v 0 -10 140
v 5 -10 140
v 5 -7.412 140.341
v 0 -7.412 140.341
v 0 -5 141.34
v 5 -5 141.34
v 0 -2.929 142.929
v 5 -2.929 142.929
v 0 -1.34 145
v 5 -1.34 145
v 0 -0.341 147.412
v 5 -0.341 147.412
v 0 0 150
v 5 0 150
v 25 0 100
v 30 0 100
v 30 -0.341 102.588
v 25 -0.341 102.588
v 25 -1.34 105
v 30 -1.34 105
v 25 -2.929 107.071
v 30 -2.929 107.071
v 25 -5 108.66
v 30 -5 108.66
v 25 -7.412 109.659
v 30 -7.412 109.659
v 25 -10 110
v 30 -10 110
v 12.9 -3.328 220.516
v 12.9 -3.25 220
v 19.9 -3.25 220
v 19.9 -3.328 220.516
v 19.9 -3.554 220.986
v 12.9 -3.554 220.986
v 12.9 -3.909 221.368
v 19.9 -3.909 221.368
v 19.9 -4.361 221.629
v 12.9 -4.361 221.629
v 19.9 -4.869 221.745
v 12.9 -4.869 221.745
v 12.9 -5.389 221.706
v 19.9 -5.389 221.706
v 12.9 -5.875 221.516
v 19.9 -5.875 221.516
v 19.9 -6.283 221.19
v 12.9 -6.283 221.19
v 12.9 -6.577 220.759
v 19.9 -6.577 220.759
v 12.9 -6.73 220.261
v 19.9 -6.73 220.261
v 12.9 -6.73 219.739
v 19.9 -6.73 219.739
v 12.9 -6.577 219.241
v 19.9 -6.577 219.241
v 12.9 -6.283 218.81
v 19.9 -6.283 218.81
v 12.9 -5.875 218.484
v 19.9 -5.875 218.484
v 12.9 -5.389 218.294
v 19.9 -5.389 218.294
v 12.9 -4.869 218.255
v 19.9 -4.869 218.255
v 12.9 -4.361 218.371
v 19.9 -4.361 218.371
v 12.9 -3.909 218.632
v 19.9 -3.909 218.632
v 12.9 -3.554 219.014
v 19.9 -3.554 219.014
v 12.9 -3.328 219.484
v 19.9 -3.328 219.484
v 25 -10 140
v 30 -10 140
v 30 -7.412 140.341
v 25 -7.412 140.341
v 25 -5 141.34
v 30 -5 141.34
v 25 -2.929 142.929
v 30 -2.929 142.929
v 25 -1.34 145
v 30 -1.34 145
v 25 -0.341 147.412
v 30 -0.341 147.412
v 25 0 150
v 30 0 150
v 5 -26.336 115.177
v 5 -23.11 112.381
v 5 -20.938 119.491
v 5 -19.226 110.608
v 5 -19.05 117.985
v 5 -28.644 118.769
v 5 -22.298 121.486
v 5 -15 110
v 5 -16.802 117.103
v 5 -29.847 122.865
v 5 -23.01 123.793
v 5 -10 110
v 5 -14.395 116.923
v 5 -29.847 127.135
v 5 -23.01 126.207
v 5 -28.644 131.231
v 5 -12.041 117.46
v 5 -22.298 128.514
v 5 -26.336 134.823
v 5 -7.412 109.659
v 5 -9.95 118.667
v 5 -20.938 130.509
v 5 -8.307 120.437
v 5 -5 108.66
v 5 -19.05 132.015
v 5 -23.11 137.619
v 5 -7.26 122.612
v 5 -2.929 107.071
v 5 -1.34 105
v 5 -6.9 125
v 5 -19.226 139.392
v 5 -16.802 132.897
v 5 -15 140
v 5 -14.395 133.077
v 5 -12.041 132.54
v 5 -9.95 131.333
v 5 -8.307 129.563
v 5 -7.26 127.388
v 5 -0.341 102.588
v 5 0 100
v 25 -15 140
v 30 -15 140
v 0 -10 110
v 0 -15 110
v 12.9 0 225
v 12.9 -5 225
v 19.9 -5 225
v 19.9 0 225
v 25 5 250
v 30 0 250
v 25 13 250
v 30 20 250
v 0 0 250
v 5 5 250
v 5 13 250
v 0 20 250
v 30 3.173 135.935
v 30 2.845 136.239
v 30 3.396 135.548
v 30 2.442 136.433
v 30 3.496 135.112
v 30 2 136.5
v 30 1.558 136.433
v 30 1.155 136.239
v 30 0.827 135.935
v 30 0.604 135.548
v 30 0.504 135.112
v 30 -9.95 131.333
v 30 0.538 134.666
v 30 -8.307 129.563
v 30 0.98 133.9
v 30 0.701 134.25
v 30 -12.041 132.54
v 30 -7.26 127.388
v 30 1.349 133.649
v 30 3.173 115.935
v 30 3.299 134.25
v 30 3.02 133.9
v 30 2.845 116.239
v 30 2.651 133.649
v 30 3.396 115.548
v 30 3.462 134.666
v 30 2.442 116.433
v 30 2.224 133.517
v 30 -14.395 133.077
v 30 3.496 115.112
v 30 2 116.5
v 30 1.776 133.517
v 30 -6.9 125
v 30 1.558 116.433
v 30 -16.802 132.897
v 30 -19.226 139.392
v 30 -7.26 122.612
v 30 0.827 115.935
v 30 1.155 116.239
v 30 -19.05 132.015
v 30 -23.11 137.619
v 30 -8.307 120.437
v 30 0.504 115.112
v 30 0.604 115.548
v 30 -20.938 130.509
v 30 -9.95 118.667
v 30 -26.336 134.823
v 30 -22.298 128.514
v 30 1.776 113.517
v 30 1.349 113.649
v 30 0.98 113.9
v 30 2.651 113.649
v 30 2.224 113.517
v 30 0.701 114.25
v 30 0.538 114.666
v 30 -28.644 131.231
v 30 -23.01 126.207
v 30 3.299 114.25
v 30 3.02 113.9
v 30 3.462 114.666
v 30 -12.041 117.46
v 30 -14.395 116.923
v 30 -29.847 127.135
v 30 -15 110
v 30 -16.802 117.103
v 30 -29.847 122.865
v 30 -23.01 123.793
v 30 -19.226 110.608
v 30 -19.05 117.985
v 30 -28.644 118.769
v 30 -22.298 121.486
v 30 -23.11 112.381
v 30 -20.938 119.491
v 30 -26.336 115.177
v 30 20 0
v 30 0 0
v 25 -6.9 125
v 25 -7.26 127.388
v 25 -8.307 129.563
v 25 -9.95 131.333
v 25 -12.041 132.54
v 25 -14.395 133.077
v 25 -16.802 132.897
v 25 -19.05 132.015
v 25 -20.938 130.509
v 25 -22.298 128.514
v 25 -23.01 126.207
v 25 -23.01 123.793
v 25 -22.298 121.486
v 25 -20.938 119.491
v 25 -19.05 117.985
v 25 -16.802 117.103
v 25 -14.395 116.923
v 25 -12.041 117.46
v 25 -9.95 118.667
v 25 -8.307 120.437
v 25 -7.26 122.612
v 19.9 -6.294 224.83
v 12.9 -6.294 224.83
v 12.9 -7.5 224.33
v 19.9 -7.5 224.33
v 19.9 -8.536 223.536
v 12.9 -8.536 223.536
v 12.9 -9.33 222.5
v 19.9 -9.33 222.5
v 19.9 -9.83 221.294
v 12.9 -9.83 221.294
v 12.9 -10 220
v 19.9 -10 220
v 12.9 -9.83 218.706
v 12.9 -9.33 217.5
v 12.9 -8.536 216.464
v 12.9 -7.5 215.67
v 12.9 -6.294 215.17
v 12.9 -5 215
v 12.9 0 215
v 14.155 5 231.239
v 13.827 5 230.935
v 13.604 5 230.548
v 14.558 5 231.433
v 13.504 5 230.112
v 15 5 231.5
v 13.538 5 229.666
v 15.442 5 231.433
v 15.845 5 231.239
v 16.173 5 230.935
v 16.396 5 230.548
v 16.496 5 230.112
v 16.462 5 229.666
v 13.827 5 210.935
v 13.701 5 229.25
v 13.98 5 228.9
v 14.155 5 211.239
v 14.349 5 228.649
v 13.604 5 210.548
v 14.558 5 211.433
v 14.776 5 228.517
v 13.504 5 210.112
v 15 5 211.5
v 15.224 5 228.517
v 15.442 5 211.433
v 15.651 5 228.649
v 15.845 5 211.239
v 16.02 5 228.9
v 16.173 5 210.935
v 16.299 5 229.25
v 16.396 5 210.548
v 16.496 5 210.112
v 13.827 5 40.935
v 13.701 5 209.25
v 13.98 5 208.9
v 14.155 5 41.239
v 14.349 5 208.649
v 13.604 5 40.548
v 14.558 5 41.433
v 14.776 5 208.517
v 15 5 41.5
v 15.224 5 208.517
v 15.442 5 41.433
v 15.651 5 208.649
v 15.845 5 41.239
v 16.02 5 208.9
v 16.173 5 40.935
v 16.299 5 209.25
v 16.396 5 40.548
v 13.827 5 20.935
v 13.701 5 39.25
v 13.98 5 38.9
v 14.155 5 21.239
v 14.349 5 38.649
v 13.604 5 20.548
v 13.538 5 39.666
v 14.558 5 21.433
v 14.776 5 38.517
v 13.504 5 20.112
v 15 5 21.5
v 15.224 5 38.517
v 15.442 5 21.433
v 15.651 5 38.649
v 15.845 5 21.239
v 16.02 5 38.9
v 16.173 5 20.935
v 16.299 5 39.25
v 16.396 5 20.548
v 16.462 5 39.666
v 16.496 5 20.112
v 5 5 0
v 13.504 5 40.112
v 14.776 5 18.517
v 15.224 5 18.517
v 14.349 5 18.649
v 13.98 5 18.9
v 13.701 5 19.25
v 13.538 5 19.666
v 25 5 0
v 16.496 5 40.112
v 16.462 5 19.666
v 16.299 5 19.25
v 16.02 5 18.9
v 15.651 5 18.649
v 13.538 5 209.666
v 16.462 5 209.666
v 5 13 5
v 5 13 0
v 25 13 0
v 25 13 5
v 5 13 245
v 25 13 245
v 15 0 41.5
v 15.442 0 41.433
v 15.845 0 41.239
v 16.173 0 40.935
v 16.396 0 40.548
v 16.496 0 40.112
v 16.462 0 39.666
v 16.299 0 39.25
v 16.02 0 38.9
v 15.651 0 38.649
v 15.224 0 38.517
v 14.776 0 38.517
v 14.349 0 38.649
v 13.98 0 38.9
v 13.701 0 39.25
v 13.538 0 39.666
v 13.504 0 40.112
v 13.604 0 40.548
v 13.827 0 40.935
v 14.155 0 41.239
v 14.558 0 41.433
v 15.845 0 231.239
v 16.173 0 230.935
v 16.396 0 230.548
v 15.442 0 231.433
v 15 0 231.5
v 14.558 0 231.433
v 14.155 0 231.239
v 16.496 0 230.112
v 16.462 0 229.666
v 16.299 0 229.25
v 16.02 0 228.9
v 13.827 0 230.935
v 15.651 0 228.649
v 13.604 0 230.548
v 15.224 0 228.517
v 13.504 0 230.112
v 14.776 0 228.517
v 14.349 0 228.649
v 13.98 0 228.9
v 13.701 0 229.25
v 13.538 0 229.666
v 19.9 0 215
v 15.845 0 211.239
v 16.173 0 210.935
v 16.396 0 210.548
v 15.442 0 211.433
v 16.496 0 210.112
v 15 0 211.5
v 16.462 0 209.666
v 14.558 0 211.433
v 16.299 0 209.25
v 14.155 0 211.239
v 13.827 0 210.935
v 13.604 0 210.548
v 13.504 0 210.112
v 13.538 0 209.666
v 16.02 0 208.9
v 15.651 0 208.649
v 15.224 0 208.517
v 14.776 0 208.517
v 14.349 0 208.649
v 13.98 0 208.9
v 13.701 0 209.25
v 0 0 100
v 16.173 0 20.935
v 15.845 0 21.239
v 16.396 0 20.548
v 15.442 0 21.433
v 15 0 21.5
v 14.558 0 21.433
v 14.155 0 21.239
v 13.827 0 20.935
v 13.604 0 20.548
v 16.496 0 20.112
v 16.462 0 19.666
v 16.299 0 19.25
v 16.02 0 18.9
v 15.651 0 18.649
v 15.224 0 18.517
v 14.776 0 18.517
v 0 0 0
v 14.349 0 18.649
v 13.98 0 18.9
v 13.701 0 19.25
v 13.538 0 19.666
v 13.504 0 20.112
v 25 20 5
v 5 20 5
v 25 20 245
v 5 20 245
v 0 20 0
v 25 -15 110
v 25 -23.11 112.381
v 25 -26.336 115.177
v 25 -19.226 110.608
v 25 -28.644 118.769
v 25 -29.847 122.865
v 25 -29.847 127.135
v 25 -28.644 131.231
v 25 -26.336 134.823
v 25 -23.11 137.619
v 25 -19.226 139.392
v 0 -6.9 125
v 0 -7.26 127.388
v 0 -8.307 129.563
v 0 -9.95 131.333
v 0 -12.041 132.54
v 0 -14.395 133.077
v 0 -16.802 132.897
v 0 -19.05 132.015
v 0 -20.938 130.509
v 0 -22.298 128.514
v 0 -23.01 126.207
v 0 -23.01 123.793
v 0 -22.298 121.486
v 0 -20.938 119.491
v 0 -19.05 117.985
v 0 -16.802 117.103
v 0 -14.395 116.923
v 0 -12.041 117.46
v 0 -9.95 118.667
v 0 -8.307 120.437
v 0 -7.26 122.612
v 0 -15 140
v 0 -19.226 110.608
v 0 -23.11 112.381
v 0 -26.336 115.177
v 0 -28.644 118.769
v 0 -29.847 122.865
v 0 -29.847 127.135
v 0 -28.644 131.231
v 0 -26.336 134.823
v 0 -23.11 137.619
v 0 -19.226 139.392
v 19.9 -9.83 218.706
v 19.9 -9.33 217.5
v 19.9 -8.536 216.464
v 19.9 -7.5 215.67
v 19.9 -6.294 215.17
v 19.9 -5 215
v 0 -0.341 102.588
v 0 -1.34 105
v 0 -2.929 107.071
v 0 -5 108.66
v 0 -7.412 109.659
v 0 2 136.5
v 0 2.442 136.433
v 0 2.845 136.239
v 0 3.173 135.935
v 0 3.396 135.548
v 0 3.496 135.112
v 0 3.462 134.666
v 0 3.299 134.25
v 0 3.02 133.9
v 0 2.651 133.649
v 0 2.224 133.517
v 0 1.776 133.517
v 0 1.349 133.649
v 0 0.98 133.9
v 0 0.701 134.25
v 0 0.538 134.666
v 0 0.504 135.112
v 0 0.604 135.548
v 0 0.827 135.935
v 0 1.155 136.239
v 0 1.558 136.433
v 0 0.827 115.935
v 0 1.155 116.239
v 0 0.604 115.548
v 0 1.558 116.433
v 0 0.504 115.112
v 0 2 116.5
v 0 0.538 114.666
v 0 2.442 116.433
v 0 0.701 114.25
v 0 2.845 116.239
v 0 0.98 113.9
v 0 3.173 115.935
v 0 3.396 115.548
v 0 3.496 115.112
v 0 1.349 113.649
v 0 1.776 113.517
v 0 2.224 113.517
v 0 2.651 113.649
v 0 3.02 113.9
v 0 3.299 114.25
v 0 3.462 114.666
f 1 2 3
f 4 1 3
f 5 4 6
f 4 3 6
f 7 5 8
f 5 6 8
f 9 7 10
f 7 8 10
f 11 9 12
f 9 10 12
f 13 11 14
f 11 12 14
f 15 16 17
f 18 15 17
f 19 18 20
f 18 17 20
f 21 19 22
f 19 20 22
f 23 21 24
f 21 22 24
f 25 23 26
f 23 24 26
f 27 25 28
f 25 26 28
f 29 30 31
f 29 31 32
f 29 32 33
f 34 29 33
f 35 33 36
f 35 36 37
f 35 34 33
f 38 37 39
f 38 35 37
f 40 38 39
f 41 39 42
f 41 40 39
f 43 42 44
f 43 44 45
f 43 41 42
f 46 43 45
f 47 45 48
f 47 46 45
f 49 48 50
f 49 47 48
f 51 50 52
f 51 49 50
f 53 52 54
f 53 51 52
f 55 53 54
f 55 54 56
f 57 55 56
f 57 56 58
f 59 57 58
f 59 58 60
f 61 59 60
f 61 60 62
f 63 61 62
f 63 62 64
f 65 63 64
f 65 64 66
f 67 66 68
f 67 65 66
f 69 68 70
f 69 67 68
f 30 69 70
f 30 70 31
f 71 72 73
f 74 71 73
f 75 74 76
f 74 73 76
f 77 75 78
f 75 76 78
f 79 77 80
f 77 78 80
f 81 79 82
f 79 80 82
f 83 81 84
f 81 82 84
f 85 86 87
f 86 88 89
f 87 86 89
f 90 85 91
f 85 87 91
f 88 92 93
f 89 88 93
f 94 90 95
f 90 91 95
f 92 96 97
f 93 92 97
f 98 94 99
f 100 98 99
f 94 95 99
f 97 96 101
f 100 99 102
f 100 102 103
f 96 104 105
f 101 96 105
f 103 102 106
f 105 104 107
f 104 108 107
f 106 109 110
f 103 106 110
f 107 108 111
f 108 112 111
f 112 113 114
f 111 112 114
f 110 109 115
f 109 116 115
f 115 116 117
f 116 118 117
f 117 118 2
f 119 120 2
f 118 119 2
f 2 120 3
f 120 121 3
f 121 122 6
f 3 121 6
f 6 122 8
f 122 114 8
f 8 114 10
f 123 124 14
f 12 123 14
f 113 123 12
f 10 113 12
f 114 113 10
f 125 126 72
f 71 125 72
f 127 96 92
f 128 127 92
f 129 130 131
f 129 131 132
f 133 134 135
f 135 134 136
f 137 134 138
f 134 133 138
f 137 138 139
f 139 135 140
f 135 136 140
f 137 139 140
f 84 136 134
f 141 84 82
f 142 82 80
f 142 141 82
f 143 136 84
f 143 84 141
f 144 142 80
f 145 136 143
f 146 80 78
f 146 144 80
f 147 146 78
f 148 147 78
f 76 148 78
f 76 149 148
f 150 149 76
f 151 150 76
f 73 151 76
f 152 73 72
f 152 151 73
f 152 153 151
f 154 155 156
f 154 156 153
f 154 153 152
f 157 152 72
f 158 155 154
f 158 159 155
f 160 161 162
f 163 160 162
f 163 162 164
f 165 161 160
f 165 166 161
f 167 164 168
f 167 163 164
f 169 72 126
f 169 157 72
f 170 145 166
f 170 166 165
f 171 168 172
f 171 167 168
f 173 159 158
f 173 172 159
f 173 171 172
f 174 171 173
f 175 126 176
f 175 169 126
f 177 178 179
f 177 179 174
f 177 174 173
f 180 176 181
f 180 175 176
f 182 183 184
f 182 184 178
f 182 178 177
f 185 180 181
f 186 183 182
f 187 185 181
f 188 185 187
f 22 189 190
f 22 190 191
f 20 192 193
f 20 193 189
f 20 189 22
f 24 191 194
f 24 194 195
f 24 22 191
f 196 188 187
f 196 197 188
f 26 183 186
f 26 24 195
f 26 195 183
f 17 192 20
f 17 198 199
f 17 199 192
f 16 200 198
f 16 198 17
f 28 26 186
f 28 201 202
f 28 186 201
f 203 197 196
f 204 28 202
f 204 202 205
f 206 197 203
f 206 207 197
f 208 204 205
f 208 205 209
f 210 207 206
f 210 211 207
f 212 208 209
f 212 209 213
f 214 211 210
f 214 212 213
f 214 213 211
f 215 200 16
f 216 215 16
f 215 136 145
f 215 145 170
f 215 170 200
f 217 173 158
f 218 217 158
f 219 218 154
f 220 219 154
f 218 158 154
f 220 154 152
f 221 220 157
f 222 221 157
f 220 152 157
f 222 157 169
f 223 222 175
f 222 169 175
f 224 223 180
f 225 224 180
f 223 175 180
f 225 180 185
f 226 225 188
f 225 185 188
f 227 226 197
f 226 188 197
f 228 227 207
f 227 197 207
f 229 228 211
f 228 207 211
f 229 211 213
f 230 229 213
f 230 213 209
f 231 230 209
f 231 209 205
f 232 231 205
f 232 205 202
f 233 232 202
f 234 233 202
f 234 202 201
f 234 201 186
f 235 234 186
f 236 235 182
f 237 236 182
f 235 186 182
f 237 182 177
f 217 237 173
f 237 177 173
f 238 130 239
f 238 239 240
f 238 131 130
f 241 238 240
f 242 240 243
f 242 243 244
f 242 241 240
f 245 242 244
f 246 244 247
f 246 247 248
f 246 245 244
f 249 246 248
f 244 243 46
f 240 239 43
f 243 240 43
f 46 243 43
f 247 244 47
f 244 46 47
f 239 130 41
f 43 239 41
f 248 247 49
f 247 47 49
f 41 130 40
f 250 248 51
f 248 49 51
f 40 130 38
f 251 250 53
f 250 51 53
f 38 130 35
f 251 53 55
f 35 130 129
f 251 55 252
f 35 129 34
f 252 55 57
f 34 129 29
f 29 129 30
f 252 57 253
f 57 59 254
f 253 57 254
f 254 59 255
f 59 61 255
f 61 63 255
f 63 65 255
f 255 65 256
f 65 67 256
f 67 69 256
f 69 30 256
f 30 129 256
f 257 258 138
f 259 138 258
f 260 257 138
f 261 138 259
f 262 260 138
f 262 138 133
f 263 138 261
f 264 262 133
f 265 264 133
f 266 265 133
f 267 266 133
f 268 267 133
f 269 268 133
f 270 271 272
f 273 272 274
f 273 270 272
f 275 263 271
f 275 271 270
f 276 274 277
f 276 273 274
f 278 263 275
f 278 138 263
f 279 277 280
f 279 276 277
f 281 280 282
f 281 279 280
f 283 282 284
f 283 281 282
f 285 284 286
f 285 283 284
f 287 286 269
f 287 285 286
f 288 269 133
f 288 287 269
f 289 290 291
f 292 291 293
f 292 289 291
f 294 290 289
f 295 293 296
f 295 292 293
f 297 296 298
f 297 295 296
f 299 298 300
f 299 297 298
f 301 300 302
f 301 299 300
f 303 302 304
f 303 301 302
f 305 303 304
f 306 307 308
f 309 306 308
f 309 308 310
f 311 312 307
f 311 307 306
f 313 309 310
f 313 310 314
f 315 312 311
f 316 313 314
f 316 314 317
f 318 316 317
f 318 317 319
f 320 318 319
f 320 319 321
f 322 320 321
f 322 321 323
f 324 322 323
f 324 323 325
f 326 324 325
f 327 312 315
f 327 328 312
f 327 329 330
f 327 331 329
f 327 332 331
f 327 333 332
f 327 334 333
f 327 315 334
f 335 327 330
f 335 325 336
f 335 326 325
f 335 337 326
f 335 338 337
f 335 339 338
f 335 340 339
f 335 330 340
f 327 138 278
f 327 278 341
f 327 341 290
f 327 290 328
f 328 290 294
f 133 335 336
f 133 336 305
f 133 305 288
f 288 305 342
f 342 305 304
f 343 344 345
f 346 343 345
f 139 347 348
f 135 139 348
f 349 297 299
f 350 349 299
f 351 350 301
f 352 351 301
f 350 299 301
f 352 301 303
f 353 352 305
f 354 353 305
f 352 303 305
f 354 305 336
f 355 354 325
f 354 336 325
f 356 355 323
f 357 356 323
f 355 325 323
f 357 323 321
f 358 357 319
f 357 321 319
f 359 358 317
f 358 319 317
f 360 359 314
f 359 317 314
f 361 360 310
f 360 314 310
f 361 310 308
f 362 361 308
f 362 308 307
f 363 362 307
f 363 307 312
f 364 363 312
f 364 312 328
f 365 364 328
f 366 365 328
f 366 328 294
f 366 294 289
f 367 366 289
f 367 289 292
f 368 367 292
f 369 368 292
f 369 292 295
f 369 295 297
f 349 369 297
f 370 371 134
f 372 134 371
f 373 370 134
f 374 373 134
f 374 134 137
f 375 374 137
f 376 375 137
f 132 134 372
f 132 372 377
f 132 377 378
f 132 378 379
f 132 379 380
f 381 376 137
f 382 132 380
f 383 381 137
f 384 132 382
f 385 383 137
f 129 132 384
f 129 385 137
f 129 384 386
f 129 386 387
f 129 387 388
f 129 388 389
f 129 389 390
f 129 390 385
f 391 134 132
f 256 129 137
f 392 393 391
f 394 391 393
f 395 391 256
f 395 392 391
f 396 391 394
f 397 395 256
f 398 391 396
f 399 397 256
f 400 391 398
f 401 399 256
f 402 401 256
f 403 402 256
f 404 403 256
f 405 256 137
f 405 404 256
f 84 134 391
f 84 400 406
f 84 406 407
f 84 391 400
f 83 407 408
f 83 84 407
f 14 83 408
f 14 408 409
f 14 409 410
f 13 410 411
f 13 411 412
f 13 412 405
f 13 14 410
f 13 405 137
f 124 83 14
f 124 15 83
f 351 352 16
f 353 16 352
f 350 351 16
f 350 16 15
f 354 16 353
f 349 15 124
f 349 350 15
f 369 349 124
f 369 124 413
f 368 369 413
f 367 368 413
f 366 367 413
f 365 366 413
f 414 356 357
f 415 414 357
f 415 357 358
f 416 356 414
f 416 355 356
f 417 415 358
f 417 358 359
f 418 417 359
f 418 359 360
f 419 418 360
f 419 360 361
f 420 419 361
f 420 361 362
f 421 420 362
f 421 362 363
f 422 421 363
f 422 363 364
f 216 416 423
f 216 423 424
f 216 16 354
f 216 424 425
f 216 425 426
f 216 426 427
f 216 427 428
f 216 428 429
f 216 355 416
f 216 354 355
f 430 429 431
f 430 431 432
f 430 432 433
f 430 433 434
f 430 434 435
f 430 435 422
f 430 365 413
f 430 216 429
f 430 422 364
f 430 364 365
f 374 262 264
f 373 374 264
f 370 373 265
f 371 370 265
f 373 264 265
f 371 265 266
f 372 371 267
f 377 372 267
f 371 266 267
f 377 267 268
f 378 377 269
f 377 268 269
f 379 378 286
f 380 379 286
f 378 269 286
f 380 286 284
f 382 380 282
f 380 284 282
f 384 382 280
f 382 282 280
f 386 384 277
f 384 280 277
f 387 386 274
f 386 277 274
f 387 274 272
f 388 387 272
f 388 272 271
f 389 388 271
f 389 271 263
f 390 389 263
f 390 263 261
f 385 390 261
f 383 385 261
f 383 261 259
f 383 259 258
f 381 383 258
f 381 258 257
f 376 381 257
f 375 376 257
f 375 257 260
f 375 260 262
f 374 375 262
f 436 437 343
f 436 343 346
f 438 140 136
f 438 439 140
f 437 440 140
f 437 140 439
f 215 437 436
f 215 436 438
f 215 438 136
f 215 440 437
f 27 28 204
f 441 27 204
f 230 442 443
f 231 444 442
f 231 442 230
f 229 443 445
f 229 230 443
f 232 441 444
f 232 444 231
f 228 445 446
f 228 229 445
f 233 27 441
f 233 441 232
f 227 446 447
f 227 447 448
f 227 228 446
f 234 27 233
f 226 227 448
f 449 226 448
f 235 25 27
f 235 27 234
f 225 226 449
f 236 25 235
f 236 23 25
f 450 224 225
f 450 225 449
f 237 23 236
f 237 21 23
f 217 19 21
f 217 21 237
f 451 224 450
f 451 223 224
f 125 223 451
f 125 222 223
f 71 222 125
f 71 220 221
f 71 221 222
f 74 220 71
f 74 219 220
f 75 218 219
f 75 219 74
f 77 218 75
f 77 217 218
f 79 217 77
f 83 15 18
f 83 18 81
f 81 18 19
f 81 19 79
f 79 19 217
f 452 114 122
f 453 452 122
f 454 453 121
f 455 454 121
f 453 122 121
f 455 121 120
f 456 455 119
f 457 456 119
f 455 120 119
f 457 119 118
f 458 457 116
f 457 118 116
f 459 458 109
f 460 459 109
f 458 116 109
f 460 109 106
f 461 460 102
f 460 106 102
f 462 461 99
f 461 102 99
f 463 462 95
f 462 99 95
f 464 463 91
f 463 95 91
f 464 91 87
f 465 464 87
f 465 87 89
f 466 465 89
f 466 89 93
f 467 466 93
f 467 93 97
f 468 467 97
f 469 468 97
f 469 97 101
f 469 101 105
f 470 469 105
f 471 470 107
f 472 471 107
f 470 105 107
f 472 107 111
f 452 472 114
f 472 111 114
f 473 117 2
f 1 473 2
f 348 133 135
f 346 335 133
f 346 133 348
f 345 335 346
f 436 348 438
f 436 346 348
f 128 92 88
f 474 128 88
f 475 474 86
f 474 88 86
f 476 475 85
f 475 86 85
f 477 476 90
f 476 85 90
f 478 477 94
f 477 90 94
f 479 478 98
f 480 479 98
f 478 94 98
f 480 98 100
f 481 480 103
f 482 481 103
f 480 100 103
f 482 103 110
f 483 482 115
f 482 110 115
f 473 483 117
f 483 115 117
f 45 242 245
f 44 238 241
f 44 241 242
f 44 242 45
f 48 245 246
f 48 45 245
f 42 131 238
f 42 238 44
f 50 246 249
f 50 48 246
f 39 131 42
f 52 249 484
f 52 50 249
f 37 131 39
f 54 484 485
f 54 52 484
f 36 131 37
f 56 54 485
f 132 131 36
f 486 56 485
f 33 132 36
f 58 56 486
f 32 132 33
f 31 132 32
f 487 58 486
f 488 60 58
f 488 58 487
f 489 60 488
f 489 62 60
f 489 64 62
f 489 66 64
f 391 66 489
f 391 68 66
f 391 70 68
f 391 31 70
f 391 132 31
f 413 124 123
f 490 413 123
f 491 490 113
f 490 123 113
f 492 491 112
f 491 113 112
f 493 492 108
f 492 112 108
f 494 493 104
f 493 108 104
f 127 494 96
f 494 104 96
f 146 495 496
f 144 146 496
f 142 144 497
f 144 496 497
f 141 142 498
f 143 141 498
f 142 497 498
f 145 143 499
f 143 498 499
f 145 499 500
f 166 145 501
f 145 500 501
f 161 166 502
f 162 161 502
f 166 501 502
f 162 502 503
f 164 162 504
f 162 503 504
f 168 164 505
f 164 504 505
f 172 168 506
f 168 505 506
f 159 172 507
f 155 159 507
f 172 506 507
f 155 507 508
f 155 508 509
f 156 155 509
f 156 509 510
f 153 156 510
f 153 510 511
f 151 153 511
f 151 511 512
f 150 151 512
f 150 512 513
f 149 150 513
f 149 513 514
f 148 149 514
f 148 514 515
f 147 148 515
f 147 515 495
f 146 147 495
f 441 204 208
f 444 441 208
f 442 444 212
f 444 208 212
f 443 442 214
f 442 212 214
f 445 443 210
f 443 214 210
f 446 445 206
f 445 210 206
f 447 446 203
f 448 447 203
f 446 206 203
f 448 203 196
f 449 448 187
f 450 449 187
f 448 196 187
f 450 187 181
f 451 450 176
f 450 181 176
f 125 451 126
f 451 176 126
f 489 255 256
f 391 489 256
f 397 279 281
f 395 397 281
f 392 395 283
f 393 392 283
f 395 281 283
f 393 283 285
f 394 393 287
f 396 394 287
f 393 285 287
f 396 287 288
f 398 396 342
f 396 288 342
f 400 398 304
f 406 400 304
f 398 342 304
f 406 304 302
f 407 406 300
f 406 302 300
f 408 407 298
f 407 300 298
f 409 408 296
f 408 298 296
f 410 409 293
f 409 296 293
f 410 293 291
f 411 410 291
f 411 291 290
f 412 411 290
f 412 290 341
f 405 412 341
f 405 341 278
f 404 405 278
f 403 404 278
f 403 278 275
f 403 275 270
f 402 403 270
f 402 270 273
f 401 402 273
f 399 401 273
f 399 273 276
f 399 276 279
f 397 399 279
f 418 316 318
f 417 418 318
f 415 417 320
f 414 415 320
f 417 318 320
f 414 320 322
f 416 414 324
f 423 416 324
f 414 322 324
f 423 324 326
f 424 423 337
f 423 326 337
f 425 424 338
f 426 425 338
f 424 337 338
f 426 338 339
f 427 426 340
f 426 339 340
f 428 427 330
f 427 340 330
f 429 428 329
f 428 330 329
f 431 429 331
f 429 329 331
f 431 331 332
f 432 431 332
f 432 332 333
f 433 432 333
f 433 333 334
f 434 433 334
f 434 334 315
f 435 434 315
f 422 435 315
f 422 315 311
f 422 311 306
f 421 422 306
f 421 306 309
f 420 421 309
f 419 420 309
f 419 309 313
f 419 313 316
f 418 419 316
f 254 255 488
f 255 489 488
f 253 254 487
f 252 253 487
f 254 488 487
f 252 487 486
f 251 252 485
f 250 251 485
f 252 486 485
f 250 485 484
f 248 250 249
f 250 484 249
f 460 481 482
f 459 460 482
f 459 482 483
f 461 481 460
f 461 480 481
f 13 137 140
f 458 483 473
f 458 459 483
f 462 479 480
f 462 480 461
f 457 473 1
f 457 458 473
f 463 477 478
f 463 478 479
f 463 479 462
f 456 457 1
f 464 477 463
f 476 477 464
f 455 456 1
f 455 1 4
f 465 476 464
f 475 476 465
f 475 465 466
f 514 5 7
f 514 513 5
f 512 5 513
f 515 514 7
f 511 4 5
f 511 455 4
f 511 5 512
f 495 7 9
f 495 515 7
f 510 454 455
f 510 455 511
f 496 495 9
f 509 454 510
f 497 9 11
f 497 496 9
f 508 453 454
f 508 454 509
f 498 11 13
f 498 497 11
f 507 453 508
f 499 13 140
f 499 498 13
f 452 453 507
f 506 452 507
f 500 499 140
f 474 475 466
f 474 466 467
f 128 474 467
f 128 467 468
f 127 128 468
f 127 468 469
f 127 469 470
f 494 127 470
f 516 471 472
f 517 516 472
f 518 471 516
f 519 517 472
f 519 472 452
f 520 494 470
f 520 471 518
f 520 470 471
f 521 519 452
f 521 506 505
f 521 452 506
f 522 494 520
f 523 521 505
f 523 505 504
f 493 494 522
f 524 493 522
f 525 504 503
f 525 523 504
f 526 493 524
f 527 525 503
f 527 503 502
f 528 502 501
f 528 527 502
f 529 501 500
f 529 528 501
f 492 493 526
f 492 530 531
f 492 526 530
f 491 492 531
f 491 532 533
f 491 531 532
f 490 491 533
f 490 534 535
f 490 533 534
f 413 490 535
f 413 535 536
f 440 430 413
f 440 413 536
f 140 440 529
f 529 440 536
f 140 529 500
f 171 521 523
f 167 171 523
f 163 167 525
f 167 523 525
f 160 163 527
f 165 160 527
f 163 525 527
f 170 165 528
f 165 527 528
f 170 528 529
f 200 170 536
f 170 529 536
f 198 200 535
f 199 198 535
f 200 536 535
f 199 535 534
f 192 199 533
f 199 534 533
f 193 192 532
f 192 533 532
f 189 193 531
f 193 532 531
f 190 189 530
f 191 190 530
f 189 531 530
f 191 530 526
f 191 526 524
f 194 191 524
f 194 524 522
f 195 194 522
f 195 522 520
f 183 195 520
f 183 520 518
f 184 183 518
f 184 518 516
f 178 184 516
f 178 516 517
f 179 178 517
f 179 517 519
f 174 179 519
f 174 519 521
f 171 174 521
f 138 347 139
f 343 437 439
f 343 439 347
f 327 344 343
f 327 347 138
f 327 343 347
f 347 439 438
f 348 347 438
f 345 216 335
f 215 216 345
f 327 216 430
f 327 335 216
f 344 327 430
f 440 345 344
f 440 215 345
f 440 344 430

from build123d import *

# Parameters (mm, degrees)
BOSS_EXTRUDE1_DEPTH = 250
BOSS_EXTRUDE3_START = -17.1
SKETCH3_W           = 10
SKETCH3_H           = 10
SKETCH3_R           = 1.75
BOSS_EXTRUDE3_DEPTH = 7
FILLET1_R           = 5
SKETCH5_R           = 1.5
CUT_EXTRUDE1_DEPTH  = 7
SKETCH6_W           = 20
SKETCH6_H           = 5
BOSS_EXTRUDE4_DEPTH = 7
SKETCH2_R           = 8.1
BOSS_EXTRUDE5_DEPTH = 5
BOSS_EXTRUDE6_START = -25
SKETCH2_3_R         = 8.1
BOSS_EXTRUDE6_DEPTH = 5
SKETCH7_R           = 1.5
CUT_EXTRUDE2_DEPTH  = 254.574446662


with BuildPart() as part:
    # Sketch1 → Boss-Extrude1 (new body)
    with BuildSketch(Plane.XY):
        Polygon((25, 20), (30, 20), (30, 0), (0, 0), (0, 20), (5, 20), (5, 5), (25, 5), align=None)
    extrude(amount=BOSS_EXTRUDE1_DEPTH)

    # Sketch3 → Boss-Extrude3 (add)
    with BuildSketch(Plane(origin=(30, 0, 0), x_dir=(0, 0, -1), z_dir=(1, 0, 0)).offset(BOSS_EXTRUDE3_START)):
        with Locations((-220, -5)):
            Rectangle(SKETCH3_W, SKETCH3_H)
        with Locations(Location((-220, -5, 0), (0, 0, 90))):
            Circle(SKETCH3_R, mode=Mode.SUBTRACT)
    extrude(amount=BOSS_EXTRUDE3_DEPTH)

    # Fillet1
    fillet1_edges = [part.edges().sort_by_distance(p)[0] for p in [
        (16.4, -10, 215),
        (16.4, -10, 225),
    ]]
    fillet(fillet1_edges, radius=FILLET1_R - 0.0001)  # a hair under: the kernel refuses the full size

    # Sketch5 → Cut-Extrude1 (cut)
    with BuildSketch(Plane(origin=(0, 5, 0), x_dir=(1, 0, 0), z_dir=(0, 1, 0))):
        with Locations(Location((15, -230, 0), (0, 0, 270))):
            Circle(SKETCH5_R)
        with Locations(Location((15, -210, 0), (0, 0, 270))):
            Circle(SKETCH5_R)
        with Locations(Location((15, -40, 0), (0, 0, 270))):
            Circle(SKETCH5_R)
        with Locations(Location((15, -20, 0), (0, 0, 270))):
            Circle(SKETCH5_R)
    extrude(amount=-CUT_EXTRUDE1_DEPTH, mode=Mode.SUBTRACT)

    # Sketch6 → Boss-Extrude4 (add)
    with BuildSketch(Plane(origin=(0, 20, 0), x_dir=(1, 0, 0), z_dir=(0, 1, 0))):
        with Locations((15, -2.5)):
            Rectangle(SKETCH6_W, SKETCH6_H)
        with Locations((15, -247.5)):
            Rectangle(SKETCH6_W, SKETCH6_H)
    extrude(amount=-BOSS_EXTRUDE4_DEPTH)

    # Sketch2 → Boss-Extrude5 (add)
    with BuildSketch(Plane(origin=(30, 0, 0), x_dir=(0, 0, -1), z_dir=(1, 0, 0))):
        with BuildLine():
            Line((-140, -15), (-140, -10))
            ThreePointArc((-140, -10), (-142.928932188, -2.928932188), (-150, 0))
            Line((-150, 0), (-100, 0))
            ThreePointArc((-100, 0), (-107.071067812, -2.928932188), (-110, -10))
            Line((-110, -10), (-110, -15))
            ThreePointArc((-110, -15), (-125, -30), (-140, -15))
        make_face()
        with Locations(Location((-125, -15, 0), (0, 0, 90))):
            Circle(SKETCH2_R, mode=Mode.SUBTRACT)
    extrude(amount=-BOSS_EXTRUDE5_DEPTH)

    # Sketch2<3> → Boss-Extrude6 (add)
    with BuildSketch(Plane(origin=(30, 0, 0), x_dir=(0, 0, -1), z_dir=(1, 0, 0)).offset(BOSS_EXTRUDE6_START)):
        with BuildLine():
            Line((-140, -15), (-140, -10))
            ThreePointArc((-140, -10), (-142.928932188, -2.928932188), (-150, 0))
            Line((-150, 0), (-100, 0))
            ThreePointArc((-100, 0), (-107.071067812, -2.928932188), (-110, -10))
            Line((-110, -10), (-110, -15))
            ThreePointArc((-110, -15), (-125, -30), (-140, -15))
        make_face()
        with Locations(Location((-125, -15, 0), (0, 0, 90))):
            Circle(SKETCH2_3_R, mode=Mode.SUBTRACT)
    extrude(amount=-BOSS_EXTRUDE6_DEPTH)

    # Sketch7 → Cut-Extrude2 (cut, through all)
    with BuildSketch(Plane.ZY):
        with Locations((115, 2)):
            Circle(SKETCH7_R)
        with Locations((135, 2)):
            Circle(SKETCH7_R)
    extrude(amount=-CUT_EXTRUDE2_DEPTH, mode=Mode.SUBTRACT)


solid = part.part
